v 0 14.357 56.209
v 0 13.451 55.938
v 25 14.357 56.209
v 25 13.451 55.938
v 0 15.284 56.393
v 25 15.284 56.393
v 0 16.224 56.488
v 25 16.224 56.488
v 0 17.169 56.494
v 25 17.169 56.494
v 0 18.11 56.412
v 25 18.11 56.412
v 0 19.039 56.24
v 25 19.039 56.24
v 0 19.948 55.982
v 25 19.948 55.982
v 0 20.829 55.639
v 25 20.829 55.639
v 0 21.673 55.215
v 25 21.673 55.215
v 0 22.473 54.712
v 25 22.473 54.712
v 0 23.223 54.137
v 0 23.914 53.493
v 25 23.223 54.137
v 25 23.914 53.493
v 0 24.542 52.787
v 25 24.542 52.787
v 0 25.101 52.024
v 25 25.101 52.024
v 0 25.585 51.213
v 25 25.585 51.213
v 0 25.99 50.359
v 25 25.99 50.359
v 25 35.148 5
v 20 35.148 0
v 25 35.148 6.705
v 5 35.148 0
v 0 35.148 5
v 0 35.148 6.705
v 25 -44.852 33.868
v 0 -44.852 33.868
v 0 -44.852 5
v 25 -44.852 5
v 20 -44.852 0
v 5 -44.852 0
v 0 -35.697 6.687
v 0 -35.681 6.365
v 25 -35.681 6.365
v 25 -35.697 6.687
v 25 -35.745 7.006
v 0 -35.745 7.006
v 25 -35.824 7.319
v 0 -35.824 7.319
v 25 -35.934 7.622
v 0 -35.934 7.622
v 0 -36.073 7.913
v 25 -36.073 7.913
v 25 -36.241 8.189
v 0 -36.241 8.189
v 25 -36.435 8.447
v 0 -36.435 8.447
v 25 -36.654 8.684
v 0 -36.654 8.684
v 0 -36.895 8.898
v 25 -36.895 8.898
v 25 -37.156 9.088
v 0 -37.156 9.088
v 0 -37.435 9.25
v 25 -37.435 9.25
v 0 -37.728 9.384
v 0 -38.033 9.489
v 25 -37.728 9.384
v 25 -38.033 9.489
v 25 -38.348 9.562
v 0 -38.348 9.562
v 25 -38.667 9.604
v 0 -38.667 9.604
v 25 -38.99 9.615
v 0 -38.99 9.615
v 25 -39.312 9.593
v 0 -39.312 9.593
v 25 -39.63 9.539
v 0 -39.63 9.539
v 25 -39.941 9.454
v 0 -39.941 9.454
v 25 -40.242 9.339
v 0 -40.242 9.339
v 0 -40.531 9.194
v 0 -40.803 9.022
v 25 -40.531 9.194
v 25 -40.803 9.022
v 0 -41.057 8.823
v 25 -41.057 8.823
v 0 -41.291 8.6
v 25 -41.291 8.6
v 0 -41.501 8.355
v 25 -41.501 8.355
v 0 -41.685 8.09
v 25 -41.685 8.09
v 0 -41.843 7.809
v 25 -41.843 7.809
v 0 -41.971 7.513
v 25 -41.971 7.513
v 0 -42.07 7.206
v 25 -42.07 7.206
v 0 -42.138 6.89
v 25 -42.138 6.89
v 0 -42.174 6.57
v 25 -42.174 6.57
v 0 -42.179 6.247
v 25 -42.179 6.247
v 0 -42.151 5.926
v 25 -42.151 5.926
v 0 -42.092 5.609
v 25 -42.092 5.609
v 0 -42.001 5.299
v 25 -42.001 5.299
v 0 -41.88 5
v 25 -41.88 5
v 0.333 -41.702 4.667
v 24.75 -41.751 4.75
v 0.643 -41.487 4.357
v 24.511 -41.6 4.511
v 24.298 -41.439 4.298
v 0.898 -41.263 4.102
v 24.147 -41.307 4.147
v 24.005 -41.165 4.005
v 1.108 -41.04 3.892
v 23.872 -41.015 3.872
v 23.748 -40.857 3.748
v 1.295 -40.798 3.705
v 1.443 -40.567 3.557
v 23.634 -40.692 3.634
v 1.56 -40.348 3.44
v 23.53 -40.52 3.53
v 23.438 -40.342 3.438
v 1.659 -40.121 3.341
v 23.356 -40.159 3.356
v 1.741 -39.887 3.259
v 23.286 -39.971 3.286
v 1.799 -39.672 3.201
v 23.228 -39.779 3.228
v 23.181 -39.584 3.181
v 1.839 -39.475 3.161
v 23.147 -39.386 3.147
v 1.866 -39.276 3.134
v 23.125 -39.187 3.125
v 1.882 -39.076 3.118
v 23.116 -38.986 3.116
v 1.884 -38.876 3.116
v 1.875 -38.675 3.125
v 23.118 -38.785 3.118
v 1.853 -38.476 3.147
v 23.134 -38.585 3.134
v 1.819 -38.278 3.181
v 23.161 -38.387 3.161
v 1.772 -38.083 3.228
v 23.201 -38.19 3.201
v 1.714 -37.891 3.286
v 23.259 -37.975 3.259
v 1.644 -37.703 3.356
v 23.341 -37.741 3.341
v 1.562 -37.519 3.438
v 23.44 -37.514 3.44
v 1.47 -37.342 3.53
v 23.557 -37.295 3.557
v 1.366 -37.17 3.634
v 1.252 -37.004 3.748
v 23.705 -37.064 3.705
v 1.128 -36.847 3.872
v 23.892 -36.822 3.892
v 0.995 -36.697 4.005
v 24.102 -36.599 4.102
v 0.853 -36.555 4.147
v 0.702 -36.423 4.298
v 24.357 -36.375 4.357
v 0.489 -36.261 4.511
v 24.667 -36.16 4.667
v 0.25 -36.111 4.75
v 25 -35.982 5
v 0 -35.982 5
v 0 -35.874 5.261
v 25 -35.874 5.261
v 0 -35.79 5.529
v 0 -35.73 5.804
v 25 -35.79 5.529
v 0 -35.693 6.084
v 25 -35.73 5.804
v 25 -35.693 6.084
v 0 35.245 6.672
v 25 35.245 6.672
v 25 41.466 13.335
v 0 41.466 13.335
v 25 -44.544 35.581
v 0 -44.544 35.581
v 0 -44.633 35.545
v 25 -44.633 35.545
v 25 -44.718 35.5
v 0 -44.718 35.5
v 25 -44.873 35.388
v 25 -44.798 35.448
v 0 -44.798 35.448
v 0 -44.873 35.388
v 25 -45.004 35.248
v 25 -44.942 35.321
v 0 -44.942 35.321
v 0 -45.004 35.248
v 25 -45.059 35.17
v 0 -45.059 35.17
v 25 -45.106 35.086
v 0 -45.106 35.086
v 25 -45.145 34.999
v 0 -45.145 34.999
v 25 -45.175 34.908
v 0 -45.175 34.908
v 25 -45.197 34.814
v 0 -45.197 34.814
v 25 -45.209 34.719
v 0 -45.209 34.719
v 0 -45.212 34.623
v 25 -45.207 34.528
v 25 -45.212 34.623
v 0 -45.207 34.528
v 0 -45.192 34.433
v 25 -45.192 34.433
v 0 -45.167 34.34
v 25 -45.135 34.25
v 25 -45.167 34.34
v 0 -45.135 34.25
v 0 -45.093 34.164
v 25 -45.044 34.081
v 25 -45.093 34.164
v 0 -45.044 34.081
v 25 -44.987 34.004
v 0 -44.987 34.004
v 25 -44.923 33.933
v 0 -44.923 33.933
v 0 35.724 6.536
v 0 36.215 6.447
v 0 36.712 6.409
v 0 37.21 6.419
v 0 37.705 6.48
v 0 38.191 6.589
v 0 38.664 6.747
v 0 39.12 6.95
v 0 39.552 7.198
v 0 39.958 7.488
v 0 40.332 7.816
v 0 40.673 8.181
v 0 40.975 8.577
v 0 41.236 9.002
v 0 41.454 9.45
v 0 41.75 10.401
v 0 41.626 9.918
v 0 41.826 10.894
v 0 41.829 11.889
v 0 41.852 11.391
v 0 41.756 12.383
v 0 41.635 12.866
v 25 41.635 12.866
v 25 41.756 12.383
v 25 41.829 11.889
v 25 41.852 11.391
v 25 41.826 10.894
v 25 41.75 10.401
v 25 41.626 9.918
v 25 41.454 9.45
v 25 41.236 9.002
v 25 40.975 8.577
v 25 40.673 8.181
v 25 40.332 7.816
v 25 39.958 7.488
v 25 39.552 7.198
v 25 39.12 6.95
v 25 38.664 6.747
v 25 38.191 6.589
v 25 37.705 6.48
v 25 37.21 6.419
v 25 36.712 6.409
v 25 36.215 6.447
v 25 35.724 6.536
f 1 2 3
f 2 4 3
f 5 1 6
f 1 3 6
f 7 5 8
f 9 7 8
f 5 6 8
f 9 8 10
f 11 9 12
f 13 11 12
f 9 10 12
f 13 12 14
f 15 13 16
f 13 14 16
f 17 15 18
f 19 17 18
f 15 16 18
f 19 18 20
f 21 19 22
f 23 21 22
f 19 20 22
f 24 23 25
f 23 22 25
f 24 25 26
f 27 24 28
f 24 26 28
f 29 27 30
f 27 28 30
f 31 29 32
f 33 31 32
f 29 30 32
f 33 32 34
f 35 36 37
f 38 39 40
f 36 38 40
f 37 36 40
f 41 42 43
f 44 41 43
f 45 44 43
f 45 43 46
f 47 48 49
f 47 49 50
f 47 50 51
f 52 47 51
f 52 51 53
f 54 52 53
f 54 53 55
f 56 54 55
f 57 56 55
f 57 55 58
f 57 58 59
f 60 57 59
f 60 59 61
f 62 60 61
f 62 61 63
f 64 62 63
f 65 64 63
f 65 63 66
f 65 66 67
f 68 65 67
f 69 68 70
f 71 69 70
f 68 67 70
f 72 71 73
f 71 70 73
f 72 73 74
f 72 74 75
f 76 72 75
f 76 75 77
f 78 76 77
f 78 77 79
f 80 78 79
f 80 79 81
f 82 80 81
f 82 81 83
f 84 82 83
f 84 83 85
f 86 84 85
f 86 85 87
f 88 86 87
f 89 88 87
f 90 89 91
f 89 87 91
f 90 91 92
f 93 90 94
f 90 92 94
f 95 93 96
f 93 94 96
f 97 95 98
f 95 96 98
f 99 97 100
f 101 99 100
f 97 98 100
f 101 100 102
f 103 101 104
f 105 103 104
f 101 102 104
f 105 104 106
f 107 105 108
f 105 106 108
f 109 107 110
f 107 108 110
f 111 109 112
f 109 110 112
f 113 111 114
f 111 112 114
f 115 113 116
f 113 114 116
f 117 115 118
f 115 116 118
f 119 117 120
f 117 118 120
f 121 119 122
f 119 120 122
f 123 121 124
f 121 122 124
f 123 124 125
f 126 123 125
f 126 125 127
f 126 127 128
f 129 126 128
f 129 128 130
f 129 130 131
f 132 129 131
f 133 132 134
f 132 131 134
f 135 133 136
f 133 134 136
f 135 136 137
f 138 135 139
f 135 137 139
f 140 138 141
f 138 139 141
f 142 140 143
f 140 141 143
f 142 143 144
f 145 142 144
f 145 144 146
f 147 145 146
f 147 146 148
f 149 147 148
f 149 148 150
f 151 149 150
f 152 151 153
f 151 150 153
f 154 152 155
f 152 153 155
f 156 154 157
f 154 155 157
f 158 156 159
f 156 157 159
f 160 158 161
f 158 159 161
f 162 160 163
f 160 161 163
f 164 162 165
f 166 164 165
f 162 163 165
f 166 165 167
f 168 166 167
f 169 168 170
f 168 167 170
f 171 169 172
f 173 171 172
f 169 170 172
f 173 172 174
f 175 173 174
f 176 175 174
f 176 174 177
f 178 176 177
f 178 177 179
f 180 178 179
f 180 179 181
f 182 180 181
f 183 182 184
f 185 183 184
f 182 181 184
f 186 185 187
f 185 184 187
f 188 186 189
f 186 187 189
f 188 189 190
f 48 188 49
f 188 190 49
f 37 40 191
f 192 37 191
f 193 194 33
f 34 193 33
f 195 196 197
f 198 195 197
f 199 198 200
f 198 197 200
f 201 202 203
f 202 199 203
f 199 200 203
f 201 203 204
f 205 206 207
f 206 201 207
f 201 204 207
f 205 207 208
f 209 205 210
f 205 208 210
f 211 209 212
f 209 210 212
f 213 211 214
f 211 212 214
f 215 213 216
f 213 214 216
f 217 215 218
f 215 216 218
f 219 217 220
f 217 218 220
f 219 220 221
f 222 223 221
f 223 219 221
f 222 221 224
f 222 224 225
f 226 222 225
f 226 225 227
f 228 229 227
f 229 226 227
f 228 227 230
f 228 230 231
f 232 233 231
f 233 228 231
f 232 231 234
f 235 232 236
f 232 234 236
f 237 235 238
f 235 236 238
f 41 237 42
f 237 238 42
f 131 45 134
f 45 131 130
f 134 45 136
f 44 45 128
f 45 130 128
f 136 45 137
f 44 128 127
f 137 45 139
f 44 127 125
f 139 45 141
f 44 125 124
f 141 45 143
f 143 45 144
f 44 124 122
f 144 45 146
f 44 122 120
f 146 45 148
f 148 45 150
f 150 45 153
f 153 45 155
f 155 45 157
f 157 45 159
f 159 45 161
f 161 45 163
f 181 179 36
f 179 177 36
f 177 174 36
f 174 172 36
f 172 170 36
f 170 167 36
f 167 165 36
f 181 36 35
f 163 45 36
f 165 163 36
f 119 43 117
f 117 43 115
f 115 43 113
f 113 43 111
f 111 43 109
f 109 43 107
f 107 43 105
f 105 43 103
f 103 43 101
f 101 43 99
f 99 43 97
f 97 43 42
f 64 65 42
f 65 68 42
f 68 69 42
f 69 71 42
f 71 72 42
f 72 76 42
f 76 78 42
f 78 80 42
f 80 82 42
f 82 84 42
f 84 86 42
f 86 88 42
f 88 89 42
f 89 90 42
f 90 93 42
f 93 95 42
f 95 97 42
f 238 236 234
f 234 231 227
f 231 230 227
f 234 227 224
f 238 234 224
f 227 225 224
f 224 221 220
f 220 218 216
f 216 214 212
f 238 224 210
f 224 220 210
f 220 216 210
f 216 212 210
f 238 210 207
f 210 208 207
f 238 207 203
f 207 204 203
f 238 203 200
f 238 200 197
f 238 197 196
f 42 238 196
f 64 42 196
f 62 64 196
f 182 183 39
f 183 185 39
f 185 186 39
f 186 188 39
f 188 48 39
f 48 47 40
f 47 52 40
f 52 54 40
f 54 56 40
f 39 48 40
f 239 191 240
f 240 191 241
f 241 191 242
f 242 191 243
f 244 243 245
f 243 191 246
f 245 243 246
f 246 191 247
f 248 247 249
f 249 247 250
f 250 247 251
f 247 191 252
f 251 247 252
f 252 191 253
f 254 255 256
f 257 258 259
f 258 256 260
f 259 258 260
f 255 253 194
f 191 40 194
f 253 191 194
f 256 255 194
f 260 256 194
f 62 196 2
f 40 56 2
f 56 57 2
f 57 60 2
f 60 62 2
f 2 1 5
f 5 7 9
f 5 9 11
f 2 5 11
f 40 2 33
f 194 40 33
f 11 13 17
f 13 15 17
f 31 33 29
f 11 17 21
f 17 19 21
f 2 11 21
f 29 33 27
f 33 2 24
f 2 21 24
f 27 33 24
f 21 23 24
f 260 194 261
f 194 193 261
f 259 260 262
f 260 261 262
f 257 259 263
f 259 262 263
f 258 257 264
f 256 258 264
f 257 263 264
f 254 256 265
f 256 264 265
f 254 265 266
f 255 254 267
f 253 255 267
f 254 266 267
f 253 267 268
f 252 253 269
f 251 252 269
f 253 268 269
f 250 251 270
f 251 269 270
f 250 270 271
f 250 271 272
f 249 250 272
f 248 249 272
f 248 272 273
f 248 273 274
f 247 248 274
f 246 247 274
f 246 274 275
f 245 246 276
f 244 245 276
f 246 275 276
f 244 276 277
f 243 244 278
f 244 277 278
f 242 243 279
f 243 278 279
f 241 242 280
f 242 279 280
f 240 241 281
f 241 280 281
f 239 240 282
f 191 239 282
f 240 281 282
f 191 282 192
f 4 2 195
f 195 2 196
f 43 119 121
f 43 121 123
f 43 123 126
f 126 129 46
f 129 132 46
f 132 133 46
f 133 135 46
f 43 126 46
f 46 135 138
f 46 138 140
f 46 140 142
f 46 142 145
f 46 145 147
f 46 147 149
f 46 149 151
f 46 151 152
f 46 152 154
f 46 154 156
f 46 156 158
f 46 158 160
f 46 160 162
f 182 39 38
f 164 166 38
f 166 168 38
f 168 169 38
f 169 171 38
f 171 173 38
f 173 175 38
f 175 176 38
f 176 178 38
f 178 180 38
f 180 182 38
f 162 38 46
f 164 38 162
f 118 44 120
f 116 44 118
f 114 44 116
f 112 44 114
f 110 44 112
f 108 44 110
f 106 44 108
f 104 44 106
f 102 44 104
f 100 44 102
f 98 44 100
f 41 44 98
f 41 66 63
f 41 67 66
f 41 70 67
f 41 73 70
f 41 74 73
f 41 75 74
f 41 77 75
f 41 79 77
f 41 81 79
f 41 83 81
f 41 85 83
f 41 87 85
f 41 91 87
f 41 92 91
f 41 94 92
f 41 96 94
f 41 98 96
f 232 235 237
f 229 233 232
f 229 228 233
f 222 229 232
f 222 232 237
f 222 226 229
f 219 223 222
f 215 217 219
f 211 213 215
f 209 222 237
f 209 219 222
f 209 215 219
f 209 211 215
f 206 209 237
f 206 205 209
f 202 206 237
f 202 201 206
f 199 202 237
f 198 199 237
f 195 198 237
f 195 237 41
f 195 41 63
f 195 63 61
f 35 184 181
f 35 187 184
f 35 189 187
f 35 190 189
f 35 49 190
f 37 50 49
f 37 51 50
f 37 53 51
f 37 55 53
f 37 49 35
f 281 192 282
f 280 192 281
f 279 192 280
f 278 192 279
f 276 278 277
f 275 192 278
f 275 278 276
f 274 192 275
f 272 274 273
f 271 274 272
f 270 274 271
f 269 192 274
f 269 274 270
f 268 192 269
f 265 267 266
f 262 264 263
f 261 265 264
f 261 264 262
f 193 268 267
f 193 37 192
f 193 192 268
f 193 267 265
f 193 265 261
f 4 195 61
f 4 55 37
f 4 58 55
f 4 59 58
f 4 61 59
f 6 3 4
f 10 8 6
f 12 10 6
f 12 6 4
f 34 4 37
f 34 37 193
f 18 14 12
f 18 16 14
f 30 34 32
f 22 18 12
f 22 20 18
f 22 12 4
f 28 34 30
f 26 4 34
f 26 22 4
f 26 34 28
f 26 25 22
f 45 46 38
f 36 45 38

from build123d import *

# Parameters (mm, degrees)
F1_DEPTH     = 25
F3_DEPTH     = 25
F5_D         = 6.5
F6_R         = 10
F7_R         = 5
F8_T1_DEPTH  = 38.943500224
F9_T1_DEPTH  = 105.7168298797
F10_T1_DEPTH = 105.7168298797


# Not quite as in the source:
# - a fillet or chamfer that OpenCascade refuses, or shapes differently, is made with other operations: its cross-section is extruded or revolved along the edge and cut away or added


with BuildPart() as f1:
    # F0 (on Right) → F1 (new body)
    with BuildSketch(Plane.YZ):
        Polygon((-44.8519773781, 0), (35.1480226219, 0), (35.1480226219, 27.3848697543), (-44.8519773781, 35), align=None)
    extrude(amount=F1_DEPTH)

    # F2 (on Right) → F3 (join)
    with BuildSketch(Plane.YZ):
        Polygon((-47.1750815473, 34.6570886492), (45.7401350141, 3.1085526571), (22.3519746214, 59.0625032783), align=None)
    extrude(amount=F3_DEPTH)

    # F5 (through all)
    with Locations(Plane(origin=(0, 0, 0), x_dir=(0, -1, 0), z_dir=(-1, 0, 0))):
        with Locations((38.9309227467, 6.3651315868)):
            Hole(F5_D / 2)

    # F6
    f6_edges = [f1.edges().sort_by_distance(p)[0] for p in [
        (12.5, 22.351975, 59.062503),
    ]]
    fillet(f6_edges, radius=F6_R)

    # F7
    f7_edges = [f1.edges().sort_by_distance(p)[0] for p in [
        (12.5, 45.740135, 3.108553),
    ]]
    fillet(f7_edges, radius=F7_R)

    # F8: fillet of radius 1 on 1 edges, made by hand

    # F8_s2 → F8_t1 (cut)
    with BuildSketch(Plane.YZ.offset(-6.971750112)):
        with BuildLine():
            ThreePointArc((-44.5437819752, 35.580728461), (-45.1967614755, 34.8143003997), (-44.8519773781, 33.8682992754))
            Line((-44.8519773781, 33.8682992754), (-44.8647654465, 33.8529218469))
            ThreePointArc((-44.8647654465, 33.8529218469), (-46.0199597269, 34.2437558604), (-47.1815118114, 34.6381505473))
            Line((-47.1815118114, 34.6381505473), (-47.1817057076, 34.6759598045))
            Line((-47.1817057076, 34.6759598045), (-44.5504061355, 35.5995996162))
            Line((-44.5504061355, 35.5995996162), (-44.5437819752, 35.580728461))
        make_face()
    extrude(amount=F8_T1_DEPTH, mode=Mode.SUBTRACT)

    # F9: chamfer of 5 on 1 edges, made by hand

    # F9_s2 → F9_t1 (cut)
    with BuildSketch(Plane.XZ.offset(-48.0064375617)):
        Polygon((20, 0), (25, 5), (25, 0), align=None)
    extrude(amount=F9_T1_DEPTH, mode=Mode.SUBTRACT)

    # F10: chamfer of 5 on 1 edges, made by hand

    # F10_s2 → F10_t1 (cut)
    with BuildSketch(Plane.XZ.offset(-48.0064375617)):
        Polygon((0, 5), (5, 0), (0, 0), align=None)
    extrude(amount=F10_T1_DEPTH, mode=Mode.SUBTRACT)


solid = f1.part
